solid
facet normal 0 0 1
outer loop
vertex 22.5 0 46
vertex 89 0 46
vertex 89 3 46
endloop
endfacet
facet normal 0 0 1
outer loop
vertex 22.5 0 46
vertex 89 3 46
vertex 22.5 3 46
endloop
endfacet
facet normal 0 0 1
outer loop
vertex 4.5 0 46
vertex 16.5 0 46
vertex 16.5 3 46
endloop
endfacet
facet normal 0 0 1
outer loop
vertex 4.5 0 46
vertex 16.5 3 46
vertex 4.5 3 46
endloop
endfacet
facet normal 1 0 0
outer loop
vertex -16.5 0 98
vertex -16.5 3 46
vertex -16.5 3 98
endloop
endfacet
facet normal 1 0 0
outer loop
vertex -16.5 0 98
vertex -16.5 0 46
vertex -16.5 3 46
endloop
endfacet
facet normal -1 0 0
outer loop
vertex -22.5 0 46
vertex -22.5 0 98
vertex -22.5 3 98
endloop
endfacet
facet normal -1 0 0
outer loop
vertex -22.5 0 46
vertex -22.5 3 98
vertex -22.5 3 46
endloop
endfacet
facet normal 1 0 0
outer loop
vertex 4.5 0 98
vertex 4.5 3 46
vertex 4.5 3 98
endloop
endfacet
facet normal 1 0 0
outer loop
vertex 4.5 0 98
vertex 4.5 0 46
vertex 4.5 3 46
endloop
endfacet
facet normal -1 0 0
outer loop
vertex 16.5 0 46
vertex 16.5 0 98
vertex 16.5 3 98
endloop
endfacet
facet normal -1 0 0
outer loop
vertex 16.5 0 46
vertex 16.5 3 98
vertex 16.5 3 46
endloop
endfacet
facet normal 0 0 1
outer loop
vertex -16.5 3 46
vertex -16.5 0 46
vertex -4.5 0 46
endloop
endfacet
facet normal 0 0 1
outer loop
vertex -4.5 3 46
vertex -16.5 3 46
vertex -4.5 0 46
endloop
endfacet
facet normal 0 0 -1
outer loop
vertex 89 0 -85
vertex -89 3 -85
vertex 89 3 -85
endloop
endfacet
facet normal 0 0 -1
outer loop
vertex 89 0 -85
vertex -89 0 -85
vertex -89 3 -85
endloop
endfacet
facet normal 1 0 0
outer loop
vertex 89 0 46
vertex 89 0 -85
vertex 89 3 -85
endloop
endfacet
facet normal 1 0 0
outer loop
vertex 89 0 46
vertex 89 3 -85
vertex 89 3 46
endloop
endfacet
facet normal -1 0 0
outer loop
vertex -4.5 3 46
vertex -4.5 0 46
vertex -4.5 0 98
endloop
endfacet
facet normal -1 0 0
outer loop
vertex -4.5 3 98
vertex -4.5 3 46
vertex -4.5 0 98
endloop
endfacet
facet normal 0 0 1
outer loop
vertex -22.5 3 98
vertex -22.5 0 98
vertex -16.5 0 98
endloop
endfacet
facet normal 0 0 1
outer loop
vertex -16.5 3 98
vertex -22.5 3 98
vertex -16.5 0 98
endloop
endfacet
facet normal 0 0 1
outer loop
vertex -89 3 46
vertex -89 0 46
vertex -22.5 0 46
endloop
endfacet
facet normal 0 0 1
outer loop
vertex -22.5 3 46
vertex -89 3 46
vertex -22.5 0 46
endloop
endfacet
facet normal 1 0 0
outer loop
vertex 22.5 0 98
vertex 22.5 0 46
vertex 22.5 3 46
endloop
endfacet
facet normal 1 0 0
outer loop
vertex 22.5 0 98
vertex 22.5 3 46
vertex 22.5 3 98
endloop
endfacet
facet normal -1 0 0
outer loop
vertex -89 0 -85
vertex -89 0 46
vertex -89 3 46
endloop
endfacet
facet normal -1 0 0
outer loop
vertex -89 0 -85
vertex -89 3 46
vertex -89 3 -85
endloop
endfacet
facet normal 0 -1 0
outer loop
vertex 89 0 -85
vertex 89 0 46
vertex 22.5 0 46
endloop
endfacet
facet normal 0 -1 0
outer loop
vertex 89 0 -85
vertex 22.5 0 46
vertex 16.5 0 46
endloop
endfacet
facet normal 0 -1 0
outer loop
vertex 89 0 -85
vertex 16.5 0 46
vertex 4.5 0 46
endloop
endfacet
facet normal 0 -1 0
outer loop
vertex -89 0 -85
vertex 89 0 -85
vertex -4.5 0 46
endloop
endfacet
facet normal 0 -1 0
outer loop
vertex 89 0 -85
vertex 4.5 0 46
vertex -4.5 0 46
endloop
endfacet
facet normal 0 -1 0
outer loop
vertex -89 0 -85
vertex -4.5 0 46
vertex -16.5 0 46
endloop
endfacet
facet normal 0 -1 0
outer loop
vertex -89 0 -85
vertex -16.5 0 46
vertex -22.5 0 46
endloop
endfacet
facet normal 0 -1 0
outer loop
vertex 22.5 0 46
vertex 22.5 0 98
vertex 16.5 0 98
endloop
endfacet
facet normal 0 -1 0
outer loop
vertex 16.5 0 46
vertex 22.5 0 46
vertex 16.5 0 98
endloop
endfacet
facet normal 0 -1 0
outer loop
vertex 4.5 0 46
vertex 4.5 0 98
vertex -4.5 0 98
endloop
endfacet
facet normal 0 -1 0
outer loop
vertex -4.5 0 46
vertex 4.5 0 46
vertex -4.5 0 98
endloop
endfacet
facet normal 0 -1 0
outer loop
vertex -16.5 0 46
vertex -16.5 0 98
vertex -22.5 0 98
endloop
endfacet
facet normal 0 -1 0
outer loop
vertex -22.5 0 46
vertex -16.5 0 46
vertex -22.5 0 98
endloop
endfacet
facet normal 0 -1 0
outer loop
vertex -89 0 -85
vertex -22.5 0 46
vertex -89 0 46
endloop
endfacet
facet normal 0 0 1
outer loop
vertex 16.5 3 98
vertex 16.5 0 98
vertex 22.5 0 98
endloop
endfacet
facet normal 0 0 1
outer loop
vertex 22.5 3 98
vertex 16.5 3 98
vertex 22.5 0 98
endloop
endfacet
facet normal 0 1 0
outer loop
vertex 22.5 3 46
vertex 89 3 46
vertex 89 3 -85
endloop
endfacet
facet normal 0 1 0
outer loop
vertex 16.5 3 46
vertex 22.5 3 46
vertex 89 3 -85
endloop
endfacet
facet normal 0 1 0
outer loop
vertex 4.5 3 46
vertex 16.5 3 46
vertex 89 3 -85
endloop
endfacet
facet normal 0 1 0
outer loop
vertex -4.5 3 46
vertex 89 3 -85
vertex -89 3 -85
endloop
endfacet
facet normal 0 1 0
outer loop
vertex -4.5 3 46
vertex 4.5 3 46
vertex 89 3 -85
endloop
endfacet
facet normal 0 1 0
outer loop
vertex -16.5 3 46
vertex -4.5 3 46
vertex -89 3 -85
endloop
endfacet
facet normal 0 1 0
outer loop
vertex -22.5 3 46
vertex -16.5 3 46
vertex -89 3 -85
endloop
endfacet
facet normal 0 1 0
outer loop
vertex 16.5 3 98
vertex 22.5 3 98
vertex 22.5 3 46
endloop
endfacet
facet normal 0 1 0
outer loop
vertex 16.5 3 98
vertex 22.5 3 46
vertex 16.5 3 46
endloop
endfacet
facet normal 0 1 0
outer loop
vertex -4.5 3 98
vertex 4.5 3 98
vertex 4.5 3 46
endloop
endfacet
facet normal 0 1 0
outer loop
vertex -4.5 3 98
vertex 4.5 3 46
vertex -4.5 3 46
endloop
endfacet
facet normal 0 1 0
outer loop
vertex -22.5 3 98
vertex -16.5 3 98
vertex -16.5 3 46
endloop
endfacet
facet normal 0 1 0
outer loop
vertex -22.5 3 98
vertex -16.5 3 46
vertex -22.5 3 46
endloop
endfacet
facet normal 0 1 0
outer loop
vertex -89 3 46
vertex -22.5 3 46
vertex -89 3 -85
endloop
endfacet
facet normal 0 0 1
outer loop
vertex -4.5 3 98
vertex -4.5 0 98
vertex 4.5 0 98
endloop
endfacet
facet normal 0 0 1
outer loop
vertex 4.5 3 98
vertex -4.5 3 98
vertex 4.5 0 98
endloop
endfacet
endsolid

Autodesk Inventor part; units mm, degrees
ref_plane "YZ Plane" through (0, 0, 0) normal (1, 0, 0) x (0, 1, 0)
ref_plane "XZ Plane" through (0, 0, 0) normal (0, 1, 0) x (-1, 0, 0)
ref_plane "XY Plane" through (0, 0, 0) normal (0, 0, 1) x (1, 0, 0)
sketch "Sketch2" plane through (0, 0, 0) normal (0, 1, 0) x (-1, 0, 0)
  line L0 (-89, 99) -> (89, 99)
  line L1 (89, 99) -> (89, -99)
  line L2 (89, -99) -> (-89, -99)
  line L3 (-89, -99) -> (-89, 99)
  line L4 (-89, 99) -> (89, -99) construction
  line L5 (89, 99) -> (-89, -99) construction
  line L6 (-89, 99) -> (89, 99)
  line L7 (89, 99) -> (89, -85)
  line L8 (89, -85) -> (-89, -85)
  line L9 (-89, -85) -> (-89, 99)
  line L10 (-4.5, 99) -> (-89, 99)
  line L11 (-89, 99) -> (-89, 46)
  line L12 (-89, 46) -> (-4.5, 46)
  line L13 (-4.5, 46) -> (-4.5, 99)
  line L14 (4.5, 99) -> (89, 99)
  line L15 (89, 99) -> (89, 46)
  line L16 (89, 46) -> (4.5, 46)
  line L17 (4.5, 46) -> (4.5, 99)
  line L18 (22.5, 77.5) -> (22.5, 66.5) projected
  line L19 (16.5, 66.5) -> (16.5, 77.5) projected
  line L20 (-22.5, 66.5) -> (-22.5, 77.5) projected
  line L21 (-16.5, 77.5) -> (-16.5, 66.5) projected
  line L22 (-22.5, 99) -> (-16.5, 99)
  line L23 (-16.5, 99) -> (-16.5, 46)
  line L24 (-16.5, 46) -> (-22.5, 46)
  line L25 (-22.5, 46) -> (-22.5, 99)
  line L26 (16.5, 99) -> (22.5, 99)
  line L27 (22.5, 99) -> (22.5, 46)
  line L28 (22.5, 46) -> (16.5, 46)
  line L29 (16.5, 46) -> (16.5, 99)
  line L30 (-89, 99) -> (89, 99)
  line L31 (89, 99) -> (89, 98)
  line L32 (89, 98) -> (-89, 98)
  line L33 (-89, 98) -> (-89, 99)
  point P0 (0, 0)
  point P1 (4.5, 99)
  point P2 (-4.5, 99)
  point P3 (-89, 46)
  point P4 (89, 46)
  point P5 (4.5, 98)
  point P6 (-4.5, 98)
  point P7 (-16.5, 98)
  point P8 (-22.5, 98)
  point P9 (22.5, 98)
  point P10 (16.5, 98)
  dimension "d8" = 178
  dimension "d9" = 198
  dimension "d10" = 14
  dimension "d11" = 84.5
  dimension "d12" = 53
  dimension "d13" = 84.5
  dimension "d14" = 53
  dimension "d17" = 9
  dimension "d18" = 1
extrude "Extrusion2" add sketch "Sketch2" along normal blind 3 contours L32 L23 L21 L12 L25 L20 | L12 L13 L32 L17 L16 L1 L8 L3 | L32 L27 L18 L16 L29 L19
equation "\"d11\" = d13"
properties part number "base" material "Steel, Alloy"
